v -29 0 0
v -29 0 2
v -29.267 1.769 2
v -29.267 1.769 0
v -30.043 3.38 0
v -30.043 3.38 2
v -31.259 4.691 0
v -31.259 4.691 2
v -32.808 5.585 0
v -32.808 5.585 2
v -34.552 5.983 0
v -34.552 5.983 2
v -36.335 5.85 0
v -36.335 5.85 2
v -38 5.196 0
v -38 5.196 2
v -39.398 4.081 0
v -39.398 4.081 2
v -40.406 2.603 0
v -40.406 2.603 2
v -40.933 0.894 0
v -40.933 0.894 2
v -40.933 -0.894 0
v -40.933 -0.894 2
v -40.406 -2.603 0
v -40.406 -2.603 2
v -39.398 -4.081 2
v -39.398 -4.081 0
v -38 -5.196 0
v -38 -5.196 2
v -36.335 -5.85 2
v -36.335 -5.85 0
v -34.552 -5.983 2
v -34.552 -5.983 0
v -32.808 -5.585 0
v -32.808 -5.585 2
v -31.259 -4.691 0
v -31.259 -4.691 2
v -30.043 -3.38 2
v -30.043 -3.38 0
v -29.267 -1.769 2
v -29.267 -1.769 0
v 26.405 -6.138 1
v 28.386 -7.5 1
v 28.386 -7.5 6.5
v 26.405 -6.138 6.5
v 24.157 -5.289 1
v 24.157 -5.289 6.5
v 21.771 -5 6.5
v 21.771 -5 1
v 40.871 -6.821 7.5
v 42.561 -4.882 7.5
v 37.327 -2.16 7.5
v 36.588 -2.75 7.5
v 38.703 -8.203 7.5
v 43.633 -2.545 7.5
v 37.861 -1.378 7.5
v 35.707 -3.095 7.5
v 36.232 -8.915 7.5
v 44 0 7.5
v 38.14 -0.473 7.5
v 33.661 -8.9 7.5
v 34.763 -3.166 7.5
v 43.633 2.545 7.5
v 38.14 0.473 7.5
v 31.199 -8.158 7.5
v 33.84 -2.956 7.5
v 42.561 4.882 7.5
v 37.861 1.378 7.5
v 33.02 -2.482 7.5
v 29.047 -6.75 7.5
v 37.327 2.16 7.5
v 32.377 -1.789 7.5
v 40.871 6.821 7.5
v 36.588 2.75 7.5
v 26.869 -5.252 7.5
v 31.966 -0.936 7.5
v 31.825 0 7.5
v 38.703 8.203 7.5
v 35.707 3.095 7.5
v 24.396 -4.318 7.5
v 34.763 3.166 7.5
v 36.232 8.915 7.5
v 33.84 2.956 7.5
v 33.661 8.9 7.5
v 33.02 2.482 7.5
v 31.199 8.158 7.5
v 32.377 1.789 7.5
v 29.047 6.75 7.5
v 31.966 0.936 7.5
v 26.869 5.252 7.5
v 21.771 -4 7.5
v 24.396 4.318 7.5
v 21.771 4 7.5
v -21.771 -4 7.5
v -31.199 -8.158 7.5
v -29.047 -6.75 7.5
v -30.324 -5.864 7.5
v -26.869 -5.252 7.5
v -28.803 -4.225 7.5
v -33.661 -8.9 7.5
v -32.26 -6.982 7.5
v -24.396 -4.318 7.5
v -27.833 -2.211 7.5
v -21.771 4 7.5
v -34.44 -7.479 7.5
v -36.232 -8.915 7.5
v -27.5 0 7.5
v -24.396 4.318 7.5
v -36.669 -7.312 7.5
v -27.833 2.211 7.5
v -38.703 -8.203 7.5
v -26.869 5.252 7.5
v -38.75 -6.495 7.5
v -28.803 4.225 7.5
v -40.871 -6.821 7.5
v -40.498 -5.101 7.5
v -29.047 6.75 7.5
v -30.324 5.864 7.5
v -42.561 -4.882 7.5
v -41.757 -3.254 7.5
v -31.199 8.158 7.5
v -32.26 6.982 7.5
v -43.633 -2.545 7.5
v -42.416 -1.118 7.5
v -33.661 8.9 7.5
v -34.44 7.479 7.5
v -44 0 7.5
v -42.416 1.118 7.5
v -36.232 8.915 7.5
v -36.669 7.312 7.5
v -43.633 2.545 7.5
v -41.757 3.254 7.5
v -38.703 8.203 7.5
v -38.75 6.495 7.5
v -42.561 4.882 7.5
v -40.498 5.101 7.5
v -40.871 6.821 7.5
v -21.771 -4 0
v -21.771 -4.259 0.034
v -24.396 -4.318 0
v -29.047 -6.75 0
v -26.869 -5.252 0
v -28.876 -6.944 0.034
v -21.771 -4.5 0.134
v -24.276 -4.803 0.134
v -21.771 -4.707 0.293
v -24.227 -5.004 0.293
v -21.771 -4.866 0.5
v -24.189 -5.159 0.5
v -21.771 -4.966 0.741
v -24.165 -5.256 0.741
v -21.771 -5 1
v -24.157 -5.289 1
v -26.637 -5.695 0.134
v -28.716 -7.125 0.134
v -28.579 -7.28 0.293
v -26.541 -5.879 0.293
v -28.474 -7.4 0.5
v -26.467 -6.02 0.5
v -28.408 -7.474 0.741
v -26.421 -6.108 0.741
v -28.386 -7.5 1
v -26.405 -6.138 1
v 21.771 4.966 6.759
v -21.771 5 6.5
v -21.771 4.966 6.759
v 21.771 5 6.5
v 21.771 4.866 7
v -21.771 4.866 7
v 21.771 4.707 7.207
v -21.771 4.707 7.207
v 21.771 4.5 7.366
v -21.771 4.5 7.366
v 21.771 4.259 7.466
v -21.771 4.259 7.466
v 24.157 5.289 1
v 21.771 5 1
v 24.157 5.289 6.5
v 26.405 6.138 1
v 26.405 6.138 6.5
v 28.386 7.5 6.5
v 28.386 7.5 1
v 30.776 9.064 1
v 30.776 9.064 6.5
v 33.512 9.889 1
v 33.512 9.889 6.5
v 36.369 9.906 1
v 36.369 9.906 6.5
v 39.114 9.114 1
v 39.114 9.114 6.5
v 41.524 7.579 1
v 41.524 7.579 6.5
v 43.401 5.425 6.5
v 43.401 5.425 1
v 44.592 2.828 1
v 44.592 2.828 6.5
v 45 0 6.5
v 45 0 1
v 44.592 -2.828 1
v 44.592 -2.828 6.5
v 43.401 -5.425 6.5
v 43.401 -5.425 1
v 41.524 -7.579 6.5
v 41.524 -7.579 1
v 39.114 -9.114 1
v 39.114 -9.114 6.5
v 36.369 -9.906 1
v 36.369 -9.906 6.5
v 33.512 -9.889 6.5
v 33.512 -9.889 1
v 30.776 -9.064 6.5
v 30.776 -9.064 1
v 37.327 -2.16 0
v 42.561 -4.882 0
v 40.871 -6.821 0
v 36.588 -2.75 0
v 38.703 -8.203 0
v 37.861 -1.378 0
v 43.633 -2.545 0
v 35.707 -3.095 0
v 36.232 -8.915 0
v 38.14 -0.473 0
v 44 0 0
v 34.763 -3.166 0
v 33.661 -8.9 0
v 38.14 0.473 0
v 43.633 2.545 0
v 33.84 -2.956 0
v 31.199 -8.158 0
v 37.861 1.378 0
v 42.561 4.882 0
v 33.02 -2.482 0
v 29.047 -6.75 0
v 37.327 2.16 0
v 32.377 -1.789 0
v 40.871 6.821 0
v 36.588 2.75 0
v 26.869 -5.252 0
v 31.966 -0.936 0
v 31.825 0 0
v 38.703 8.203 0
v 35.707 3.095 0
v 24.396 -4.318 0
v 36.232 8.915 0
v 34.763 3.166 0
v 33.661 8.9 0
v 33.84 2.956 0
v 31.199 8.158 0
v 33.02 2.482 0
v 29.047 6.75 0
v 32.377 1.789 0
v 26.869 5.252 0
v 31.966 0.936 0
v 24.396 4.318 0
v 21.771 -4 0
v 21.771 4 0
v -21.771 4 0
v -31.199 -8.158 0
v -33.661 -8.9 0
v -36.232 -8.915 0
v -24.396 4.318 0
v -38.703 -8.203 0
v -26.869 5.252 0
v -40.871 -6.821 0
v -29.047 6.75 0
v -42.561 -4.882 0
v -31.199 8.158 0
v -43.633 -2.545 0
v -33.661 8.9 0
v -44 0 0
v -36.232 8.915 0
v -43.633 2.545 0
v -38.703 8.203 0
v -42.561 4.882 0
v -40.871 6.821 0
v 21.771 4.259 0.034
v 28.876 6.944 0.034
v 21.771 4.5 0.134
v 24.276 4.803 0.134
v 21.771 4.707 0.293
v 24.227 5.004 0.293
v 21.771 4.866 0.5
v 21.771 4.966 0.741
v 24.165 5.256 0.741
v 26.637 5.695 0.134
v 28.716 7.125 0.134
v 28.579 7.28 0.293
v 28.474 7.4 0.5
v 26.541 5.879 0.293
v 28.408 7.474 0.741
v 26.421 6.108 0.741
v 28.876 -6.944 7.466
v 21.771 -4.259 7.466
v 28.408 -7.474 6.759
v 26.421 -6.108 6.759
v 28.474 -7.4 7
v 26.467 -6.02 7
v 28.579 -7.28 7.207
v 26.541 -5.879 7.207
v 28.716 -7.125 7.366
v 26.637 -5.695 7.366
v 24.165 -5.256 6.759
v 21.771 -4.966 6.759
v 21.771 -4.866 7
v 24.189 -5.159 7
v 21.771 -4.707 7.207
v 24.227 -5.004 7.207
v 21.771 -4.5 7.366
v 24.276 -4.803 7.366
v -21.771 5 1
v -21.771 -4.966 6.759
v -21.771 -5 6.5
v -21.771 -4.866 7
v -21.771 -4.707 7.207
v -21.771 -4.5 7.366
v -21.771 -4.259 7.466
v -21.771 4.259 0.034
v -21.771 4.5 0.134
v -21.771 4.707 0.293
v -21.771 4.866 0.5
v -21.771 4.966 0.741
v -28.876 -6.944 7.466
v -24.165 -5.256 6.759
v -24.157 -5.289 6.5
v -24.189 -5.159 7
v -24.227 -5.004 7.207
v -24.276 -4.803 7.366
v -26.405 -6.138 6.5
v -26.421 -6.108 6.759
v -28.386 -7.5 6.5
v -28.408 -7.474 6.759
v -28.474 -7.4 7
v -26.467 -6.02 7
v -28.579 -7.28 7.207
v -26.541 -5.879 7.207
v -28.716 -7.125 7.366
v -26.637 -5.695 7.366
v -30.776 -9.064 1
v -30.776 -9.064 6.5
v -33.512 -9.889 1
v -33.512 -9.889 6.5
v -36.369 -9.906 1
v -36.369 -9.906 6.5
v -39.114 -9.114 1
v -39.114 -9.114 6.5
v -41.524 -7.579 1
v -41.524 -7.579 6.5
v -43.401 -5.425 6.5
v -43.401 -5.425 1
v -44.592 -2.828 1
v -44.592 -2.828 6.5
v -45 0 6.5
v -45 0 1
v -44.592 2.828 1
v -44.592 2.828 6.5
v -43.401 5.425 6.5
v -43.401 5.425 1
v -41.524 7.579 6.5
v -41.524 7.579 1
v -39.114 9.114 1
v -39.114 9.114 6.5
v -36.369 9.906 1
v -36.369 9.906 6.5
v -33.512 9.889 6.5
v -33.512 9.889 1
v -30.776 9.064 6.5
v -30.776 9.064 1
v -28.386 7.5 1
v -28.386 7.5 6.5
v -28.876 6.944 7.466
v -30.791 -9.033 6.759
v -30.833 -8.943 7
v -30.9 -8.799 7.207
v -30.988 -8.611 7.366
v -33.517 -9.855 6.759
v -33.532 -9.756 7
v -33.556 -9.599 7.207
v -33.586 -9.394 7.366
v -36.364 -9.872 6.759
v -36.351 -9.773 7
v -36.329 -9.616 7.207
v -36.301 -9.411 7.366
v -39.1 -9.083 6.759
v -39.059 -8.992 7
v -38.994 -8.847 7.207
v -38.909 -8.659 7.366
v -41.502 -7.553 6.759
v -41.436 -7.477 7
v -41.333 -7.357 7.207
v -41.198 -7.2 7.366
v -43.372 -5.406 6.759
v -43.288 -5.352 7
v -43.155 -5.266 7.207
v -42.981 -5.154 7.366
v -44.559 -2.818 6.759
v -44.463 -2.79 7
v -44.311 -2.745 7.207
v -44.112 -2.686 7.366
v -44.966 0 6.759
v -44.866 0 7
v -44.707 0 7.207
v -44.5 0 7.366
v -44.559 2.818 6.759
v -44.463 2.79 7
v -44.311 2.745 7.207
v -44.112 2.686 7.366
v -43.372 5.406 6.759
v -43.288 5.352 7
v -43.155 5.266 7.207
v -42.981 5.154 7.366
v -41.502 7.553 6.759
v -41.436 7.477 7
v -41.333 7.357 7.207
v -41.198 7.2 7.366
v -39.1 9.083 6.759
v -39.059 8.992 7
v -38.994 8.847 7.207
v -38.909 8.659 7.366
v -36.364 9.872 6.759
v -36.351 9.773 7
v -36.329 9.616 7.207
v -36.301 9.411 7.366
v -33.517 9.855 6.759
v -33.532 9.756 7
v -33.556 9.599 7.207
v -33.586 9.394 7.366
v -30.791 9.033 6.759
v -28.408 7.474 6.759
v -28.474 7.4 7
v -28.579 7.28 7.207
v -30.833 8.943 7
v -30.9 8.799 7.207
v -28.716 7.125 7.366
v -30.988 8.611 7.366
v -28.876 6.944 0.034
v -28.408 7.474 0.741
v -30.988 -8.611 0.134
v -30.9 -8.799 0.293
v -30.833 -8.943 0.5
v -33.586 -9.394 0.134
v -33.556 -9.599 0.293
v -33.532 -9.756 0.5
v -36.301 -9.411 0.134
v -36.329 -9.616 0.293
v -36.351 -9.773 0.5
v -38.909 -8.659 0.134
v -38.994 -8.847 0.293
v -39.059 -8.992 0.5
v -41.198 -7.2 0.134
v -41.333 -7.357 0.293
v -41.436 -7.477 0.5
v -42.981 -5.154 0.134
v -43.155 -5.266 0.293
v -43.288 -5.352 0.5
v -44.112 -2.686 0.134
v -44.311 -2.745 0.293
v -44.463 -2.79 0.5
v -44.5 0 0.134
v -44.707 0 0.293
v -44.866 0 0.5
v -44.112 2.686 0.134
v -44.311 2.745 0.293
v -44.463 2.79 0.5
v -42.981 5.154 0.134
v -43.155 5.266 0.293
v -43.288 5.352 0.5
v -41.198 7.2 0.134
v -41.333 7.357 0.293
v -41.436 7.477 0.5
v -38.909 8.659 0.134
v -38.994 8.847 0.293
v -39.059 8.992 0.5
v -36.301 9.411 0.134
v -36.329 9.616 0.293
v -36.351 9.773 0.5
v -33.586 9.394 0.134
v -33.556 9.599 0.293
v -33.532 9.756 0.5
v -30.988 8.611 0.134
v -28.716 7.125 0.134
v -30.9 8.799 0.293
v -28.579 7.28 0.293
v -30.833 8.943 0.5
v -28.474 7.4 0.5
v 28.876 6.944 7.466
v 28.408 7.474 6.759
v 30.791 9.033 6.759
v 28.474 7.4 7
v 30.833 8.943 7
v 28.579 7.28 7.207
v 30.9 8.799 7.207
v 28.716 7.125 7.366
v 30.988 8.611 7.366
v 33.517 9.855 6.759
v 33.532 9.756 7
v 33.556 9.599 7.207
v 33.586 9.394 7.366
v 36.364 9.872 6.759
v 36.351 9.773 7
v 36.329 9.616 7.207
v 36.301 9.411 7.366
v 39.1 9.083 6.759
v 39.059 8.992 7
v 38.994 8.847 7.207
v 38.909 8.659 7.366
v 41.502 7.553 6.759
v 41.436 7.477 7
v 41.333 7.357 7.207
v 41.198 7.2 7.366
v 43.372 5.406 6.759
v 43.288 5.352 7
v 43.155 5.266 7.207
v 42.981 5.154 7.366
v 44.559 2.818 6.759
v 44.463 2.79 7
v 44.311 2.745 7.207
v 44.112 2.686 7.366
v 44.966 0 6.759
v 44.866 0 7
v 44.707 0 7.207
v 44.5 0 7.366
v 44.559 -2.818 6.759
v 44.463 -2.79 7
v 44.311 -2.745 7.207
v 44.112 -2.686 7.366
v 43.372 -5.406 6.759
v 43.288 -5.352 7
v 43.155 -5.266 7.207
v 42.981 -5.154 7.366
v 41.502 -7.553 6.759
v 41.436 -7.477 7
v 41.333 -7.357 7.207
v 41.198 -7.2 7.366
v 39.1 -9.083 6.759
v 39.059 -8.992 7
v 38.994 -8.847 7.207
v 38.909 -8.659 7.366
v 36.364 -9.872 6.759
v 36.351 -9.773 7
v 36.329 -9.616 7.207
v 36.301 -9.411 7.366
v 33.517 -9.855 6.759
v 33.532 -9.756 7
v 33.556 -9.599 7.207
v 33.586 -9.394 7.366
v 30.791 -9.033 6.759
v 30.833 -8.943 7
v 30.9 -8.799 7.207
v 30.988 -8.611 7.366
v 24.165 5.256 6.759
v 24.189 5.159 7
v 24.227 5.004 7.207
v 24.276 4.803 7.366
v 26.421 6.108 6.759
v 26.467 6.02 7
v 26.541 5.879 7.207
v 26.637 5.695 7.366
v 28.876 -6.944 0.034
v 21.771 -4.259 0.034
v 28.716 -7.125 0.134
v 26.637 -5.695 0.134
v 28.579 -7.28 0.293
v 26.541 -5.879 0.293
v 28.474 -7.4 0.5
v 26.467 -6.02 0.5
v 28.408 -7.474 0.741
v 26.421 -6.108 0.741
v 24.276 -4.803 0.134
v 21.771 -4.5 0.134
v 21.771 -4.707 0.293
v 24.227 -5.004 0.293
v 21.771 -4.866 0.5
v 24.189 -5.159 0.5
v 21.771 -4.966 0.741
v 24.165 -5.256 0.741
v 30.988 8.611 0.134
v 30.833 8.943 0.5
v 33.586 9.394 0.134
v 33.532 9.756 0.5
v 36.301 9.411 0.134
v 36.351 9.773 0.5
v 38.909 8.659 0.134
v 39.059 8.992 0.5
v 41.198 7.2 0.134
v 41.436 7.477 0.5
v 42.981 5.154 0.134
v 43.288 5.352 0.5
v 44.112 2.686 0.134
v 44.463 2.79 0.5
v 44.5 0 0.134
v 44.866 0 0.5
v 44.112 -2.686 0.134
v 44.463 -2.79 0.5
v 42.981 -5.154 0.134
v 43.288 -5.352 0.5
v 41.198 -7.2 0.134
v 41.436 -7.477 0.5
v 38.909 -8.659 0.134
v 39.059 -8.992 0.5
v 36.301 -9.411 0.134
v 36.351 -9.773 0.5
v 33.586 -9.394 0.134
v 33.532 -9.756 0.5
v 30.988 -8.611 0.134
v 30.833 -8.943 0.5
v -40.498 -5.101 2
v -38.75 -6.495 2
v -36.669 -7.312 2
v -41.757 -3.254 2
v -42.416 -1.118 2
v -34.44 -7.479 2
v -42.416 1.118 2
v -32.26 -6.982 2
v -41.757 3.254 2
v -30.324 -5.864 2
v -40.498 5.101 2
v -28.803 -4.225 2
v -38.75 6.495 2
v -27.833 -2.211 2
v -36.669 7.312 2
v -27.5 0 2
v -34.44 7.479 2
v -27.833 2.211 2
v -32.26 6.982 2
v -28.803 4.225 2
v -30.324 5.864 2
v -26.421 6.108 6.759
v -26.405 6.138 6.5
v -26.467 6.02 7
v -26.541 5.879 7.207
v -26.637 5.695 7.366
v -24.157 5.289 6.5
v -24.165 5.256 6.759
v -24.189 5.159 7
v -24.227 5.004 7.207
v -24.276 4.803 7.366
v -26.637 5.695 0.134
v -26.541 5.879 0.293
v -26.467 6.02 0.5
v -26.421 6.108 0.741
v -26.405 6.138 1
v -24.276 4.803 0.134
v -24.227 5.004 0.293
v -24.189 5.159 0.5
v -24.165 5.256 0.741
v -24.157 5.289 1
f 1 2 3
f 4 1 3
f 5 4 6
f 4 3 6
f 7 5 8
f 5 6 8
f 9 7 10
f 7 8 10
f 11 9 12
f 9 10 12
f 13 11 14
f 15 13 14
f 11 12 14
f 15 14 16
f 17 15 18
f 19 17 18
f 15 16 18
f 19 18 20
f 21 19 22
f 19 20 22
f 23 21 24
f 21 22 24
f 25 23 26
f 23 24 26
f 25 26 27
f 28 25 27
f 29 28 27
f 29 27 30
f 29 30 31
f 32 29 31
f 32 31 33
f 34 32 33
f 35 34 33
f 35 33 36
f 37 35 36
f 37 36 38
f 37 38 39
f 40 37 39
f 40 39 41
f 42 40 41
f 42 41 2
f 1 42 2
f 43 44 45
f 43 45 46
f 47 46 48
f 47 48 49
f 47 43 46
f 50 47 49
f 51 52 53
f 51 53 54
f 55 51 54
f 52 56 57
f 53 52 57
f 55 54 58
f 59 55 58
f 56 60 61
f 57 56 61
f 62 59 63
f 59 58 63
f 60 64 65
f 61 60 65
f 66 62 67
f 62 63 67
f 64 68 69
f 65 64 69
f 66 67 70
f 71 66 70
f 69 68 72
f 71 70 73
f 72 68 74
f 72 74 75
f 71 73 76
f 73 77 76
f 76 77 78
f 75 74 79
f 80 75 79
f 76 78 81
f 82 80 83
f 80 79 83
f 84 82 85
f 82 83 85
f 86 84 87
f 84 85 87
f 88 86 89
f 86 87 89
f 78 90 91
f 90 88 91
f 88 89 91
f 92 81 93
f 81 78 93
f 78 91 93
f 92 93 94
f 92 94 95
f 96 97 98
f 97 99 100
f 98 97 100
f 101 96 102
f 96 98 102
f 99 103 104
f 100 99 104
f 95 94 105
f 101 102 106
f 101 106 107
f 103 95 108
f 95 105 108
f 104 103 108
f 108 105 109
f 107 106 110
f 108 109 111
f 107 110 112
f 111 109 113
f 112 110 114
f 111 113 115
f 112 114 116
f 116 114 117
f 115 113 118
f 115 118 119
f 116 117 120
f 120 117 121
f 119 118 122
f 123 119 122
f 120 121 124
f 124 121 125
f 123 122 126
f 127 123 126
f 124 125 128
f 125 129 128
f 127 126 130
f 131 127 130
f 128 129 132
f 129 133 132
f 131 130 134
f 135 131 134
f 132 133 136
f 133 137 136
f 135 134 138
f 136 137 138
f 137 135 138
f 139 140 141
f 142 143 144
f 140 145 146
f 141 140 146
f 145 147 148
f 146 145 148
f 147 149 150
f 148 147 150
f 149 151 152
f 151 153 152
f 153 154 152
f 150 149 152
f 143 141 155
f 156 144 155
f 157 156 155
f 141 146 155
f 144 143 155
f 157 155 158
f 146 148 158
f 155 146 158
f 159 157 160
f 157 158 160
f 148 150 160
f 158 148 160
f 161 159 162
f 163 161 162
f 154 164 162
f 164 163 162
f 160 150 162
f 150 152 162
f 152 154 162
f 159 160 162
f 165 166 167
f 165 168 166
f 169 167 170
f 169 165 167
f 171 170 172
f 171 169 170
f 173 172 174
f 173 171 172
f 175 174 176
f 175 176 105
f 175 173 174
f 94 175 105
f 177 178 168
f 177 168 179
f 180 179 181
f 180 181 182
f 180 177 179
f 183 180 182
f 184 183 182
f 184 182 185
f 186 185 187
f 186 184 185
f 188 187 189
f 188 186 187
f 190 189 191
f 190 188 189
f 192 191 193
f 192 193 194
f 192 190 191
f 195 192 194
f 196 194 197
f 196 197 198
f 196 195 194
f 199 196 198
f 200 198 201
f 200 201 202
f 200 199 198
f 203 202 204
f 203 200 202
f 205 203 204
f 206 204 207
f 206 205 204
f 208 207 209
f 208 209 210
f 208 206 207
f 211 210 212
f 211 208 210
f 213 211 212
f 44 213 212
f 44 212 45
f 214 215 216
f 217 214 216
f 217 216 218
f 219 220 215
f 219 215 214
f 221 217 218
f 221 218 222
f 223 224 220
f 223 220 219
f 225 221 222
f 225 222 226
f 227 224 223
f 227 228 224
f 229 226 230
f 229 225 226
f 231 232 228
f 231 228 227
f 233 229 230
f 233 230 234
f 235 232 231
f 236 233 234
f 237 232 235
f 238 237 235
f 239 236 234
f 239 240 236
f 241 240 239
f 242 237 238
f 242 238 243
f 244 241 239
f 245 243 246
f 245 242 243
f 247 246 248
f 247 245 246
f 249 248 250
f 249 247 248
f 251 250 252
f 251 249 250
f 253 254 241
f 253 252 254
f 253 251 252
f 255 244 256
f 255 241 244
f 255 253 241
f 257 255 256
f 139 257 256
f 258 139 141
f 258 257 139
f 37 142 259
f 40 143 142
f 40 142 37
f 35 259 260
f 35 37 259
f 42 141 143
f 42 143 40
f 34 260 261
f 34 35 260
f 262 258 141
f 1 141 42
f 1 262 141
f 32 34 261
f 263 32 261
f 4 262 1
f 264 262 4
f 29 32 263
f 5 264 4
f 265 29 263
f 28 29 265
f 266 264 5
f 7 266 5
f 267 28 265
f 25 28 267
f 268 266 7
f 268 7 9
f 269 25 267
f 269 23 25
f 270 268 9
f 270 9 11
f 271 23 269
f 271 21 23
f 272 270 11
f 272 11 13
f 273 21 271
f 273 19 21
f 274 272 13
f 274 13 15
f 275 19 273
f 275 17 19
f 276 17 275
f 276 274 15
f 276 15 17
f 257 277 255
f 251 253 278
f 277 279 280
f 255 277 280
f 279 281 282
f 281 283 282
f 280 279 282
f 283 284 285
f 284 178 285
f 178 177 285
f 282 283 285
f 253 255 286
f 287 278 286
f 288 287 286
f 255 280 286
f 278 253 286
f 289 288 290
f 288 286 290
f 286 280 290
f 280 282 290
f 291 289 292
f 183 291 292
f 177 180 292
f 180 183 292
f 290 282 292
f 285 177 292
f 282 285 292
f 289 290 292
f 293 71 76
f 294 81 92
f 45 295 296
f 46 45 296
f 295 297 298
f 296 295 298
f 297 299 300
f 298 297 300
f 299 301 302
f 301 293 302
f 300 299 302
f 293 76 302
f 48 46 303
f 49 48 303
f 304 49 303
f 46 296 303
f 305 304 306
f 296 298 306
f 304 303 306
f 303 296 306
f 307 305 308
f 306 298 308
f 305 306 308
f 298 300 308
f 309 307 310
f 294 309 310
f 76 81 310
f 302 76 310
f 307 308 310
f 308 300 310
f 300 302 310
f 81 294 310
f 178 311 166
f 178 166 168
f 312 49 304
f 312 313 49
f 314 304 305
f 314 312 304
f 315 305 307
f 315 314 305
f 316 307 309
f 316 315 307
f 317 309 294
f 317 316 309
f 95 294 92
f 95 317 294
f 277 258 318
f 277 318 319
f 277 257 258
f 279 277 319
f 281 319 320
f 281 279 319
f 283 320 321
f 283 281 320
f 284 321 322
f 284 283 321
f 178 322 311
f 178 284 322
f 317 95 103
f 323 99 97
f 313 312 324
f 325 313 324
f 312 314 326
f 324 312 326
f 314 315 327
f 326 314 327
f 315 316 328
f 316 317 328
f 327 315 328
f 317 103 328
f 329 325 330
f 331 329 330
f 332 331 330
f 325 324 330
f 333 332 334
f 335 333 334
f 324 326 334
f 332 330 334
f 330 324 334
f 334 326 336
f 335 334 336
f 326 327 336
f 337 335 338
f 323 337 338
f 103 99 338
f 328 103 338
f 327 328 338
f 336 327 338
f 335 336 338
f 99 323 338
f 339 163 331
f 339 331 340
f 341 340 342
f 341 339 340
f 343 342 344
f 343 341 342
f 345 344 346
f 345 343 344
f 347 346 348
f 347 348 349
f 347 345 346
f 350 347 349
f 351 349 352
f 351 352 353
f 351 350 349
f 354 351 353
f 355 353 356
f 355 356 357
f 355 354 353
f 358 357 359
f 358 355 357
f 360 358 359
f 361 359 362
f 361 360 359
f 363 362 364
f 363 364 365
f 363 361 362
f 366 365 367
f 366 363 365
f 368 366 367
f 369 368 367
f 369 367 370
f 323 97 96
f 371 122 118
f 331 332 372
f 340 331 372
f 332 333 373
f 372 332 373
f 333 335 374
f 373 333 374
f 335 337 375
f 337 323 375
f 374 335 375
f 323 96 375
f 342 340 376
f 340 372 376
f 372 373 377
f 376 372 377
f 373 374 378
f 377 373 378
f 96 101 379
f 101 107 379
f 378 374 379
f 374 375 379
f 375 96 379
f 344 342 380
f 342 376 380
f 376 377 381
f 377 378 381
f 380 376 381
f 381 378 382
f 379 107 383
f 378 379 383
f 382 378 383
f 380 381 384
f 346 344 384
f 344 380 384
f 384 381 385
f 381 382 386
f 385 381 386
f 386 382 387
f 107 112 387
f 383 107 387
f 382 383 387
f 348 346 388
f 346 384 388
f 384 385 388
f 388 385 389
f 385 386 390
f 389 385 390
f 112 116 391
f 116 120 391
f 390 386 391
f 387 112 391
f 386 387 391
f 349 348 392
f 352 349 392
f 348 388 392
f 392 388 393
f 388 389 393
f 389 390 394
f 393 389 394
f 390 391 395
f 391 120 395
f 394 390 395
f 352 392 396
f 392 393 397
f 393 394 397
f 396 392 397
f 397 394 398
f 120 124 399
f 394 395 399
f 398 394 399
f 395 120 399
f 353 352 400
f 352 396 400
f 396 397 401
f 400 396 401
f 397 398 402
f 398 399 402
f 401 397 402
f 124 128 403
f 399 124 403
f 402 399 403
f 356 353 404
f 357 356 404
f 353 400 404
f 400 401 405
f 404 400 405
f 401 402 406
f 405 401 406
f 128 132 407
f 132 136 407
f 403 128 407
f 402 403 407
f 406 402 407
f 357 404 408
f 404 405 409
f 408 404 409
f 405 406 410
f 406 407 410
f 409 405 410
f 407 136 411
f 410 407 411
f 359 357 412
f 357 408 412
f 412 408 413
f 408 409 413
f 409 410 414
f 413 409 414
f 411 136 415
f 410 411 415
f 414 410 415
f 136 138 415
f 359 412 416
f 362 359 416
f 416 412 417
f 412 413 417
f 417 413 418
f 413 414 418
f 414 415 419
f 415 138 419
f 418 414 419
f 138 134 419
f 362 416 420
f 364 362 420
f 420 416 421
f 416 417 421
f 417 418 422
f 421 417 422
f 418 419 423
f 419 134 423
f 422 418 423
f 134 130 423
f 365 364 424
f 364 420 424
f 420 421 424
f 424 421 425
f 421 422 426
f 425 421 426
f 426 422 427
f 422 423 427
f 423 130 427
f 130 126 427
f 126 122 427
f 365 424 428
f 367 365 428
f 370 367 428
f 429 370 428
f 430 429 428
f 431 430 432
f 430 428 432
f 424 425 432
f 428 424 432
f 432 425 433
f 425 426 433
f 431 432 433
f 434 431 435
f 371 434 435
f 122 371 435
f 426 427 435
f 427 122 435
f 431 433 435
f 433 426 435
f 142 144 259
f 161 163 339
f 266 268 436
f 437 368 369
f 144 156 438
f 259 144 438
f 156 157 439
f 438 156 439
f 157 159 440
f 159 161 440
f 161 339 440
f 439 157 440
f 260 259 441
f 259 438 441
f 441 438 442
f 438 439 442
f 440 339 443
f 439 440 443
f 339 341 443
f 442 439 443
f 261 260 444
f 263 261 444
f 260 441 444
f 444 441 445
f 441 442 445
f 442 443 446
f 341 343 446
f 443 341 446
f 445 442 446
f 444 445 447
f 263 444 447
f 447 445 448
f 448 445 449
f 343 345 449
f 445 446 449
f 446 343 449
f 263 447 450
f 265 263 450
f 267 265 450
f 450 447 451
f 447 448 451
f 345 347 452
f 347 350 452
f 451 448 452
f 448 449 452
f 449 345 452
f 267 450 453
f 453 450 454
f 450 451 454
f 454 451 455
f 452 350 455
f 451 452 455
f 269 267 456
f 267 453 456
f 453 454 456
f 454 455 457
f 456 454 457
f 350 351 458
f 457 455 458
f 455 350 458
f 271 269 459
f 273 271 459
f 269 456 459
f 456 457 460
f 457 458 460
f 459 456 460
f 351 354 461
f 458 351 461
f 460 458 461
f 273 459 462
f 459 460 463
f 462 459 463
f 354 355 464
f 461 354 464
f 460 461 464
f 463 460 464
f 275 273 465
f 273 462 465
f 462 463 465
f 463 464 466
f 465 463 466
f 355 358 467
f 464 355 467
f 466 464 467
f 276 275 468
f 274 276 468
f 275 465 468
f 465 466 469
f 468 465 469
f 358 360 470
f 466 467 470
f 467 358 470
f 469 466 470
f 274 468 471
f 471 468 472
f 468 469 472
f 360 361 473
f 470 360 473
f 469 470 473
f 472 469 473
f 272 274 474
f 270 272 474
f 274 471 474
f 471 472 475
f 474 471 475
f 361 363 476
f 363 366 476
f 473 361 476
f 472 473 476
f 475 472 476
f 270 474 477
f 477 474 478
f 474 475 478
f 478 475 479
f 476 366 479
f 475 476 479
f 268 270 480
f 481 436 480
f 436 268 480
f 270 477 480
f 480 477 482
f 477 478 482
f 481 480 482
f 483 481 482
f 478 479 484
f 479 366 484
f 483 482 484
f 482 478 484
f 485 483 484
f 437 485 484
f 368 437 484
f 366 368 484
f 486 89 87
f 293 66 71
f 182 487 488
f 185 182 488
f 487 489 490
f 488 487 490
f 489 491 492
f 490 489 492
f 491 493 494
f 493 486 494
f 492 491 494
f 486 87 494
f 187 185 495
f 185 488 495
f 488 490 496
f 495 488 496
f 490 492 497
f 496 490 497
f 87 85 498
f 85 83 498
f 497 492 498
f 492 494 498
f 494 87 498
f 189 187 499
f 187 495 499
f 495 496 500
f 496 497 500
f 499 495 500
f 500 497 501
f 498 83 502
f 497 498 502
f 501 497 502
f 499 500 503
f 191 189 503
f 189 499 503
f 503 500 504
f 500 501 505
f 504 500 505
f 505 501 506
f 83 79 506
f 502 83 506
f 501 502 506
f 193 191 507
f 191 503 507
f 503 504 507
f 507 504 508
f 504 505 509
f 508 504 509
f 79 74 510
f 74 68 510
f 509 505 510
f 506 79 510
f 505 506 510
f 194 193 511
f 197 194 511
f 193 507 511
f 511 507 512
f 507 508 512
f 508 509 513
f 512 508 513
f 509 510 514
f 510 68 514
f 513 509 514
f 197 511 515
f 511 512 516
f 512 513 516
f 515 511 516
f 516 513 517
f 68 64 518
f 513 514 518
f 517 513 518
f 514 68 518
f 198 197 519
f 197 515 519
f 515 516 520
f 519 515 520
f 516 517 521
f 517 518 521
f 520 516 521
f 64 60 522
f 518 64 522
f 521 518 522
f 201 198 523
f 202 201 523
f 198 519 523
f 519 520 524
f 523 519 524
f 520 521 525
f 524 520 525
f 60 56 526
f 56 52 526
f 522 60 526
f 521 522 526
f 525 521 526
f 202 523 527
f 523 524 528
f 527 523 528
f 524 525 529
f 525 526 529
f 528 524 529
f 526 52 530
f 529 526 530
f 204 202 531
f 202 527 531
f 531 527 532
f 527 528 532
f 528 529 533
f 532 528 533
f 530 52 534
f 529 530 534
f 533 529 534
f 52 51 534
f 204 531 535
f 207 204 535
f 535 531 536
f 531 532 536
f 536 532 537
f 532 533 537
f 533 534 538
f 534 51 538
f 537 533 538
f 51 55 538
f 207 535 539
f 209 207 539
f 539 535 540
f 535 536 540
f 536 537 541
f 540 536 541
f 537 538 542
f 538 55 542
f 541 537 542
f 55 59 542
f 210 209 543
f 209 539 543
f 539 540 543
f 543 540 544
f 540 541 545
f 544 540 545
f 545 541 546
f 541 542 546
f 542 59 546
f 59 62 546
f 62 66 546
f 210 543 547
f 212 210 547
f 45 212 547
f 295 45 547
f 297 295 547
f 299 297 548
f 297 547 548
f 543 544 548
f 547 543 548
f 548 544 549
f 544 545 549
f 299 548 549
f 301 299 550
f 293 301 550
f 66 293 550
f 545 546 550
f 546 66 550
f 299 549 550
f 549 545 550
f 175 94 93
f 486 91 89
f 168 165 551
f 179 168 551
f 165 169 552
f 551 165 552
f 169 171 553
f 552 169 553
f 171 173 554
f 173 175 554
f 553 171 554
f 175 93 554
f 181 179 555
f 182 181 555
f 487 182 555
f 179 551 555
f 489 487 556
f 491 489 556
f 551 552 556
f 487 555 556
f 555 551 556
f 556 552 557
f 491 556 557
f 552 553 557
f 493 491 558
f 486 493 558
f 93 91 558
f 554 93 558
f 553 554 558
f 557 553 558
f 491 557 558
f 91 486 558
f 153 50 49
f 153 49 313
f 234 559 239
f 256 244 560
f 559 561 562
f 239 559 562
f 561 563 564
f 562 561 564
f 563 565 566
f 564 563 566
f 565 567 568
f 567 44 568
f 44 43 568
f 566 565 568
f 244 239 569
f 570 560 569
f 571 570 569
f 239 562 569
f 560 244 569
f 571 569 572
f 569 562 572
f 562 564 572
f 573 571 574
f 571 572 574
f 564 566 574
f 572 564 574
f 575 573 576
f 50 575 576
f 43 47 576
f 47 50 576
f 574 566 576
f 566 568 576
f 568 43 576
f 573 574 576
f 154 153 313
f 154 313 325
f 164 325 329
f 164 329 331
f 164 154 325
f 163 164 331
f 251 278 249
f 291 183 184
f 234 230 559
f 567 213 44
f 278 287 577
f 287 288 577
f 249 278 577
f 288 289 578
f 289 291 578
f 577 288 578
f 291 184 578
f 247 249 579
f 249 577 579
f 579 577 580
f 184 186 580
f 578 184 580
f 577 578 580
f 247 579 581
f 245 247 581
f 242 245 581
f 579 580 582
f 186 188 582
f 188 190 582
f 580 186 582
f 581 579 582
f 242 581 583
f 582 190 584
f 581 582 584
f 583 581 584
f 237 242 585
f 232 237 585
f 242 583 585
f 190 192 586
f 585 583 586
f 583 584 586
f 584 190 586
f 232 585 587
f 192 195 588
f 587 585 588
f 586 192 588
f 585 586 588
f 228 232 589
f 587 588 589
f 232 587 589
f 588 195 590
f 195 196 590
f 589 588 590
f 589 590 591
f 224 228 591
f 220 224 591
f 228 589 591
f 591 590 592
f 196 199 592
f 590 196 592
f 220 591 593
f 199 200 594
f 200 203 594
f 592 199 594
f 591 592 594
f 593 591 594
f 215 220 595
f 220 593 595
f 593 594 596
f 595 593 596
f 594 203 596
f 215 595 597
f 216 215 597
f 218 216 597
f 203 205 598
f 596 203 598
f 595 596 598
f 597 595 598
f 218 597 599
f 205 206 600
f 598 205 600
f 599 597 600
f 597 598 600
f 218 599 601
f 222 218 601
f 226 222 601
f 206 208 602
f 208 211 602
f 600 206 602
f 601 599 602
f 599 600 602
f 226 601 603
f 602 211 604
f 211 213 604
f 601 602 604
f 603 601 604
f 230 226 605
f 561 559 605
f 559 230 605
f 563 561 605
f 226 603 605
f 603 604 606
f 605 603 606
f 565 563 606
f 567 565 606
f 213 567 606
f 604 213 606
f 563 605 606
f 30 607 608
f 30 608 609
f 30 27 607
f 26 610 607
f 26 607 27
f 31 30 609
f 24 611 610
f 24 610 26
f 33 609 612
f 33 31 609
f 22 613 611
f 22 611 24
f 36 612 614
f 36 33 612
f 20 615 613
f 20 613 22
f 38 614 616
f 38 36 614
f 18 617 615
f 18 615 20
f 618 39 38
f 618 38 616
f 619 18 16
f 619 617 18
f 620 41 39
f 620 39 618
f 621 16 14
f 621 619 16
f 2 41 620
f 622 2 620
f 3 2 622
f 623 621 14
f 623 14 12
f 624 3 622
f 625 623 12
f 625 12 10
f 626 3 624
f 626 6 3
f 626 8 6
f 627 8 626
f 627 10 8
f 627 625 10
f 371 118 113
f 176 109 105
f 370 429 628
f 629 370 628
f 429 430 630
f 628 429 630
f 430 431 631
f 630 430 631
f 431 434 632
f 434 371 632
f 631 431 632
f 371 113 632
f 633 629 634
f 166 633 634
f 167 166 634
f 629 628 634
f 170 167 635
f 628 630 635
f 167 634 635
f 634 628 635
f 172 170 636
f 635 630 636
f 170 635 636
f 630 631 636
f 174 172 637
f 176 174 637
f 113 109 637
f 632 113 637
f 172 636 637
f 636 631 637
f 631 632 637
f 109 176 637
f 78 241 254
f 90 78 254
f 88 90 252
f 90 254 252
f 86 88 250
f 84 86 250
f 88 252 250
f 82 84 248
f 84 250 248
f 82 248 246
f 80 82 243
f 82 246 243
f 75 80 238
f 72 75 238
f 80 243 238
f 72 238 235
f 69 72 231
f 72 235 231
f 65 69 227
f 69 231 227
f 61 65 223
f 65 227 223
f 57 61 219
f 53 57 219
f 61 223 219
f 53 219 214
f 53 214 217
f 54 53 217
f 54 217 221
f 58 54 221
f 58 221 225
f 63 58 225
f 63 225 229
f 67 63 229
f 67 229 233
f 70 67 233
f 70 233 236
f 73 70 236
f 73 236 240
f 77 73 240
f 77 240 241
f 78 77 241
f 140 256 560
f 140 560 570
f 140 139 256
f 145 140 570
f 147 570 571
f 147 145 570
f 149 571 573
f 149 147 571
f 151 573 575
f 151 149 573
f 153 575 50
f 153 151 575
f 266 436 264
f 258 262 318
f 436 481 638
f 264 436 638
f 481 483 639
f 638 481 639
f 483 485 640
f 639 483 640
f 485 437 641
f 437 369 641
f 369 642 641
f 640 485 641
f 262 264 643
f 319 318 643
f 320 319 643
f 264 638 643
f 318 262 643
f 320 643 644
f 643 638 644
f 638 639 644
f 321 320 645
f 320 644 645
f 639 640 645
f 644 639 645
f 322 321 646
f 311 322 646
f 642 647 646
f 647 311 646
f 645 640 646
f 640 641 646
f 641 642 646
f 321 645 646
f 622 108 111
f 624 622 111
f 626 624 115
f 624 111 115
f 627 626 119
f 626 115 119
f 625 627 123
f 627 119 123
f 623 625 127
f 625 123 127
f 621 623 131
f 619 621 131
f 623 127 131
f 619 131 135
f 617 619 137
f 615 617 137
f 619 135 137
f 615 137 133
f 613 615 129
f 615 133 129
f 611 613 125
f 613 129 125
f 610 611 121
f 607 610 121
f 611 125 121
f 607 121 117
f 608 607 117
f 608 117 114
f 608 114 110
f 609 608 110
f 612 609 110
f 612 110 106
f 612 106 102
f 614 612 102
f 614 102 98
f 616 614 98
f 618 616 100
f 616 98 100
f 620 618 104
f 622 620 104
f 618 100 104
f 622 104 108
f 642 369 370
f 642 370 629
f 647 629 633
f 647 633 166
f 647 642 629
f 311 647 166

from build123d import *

# Parameters (mm, degrees)
BOSS_EXTRUDE1_DEPTH = 7.5
SKETCH2_R           = 7.5
CUT_EXTRUDE1_DEPTH  = 5.5
SKETCH3_R           = 6
CUT_EXTRUDE2_DEPTH  = 3
SKETCH4_R           = 3.175
CUT_EXTRUDE3_DEPTH  = 8.5
FILLET1_R           = 1


with BuildPart() as part:
    # Sketch1 → Boss-Extrude1 (new body)
    with BuildSketch(Plane.XY):
        with BuildLine():
            Line((-21.771243445, 5), (21.771243445, 5))
            ThreePointArc((21.771243445, 5), (25.306777351, 5.645856533), (28.385621722, 7.5))
            ThreePointArc((28.385621722, 7.5), (45, 0), (28.385621722, -7.5))
            ThreePointArc((28.385621722, -7.5), (25.306777351, -5.645856533), (21.771243445, -5))
            Line((21.771243445, -5), (-21.771243445, -5))
            ThreePointArc((-21.771243445, -5), (-25.306777351, -5.645856533), (-28.385621722, -7.5))
            ThreePointArc((-28.385621722, -7.5), (-45, 0), (-28.385621722, 7.5))
            ThreePointArc((-28.385621722, 7.5), (-25.306777351, 5.645856533), (-21.771243445, 5))
        make_face()
    extrude(amount=BOSS_EXTRUDE1_DEPTH)

    # Sketch2 → Cut-Extrude1 (cut)
    with BuildSketch(Plane.XY.offset(7.5)):
        with Locations((-35, 0)):
            Circle(SKETCH2_R)
    extrude(amount=-CUT_EXTRUDE1_DEPTH, mode=Mode.SUBTRACT)

    # Sketch3 → Cut-Extrude2 (cut, through all)
    with BuildSketch(Plane.XY.offset(2)):
        with Locations((-35, 0)):
            Circle(SKETCH3_R)
    extrude(amount=-CUT_EXTRUDE2_DEPTH, mode=Mode.SUBTRACT)

    # Sketch4 → Cut-Extrude3 (cut, through all)
    with BuildSketch(Plane(origin=(0, 0, 0), x_dir=(-1, 0, 0), z_dir=(0, 0, -1))):
        with Locations((-35, 0)):
            Circle(SKETCH4_R)
    extrude(amount=-CUT_EXTRUDE3_DEPTH, mode=Mode.SUBTRACT)

    # Fillet1
    fillet1_edges = [part.edges().sort_by_distance(p)[0] for p in [
        (25.306777351, 5.645856533, 7.5),
        (45, 0, 0),
        (25.306777351, -5.645856533, 0),
        (0, 5, 7.5),
        (-25.306777351, 5.645856533, 7.5),
        (-45, 0, 7.5),
        (-25.306777351, -5.645856533, 7.5),
        (0, -5, 7.5),
        (25.306777351, -5.645856533, 7.5),
        (45, 0, 7.5),
        (0, -5, 0),
        (-25.306777351, -5.645856533, 0),
        (-45, 0, 0),
        (-25.306777351, 5.645856533, 0),
        (0, 5, 0),
        (25.306777351, 5.645856533, 0),
    ]]
    fillet(fillet1_edges, radius=FILLET1_R)


solid = part.part
